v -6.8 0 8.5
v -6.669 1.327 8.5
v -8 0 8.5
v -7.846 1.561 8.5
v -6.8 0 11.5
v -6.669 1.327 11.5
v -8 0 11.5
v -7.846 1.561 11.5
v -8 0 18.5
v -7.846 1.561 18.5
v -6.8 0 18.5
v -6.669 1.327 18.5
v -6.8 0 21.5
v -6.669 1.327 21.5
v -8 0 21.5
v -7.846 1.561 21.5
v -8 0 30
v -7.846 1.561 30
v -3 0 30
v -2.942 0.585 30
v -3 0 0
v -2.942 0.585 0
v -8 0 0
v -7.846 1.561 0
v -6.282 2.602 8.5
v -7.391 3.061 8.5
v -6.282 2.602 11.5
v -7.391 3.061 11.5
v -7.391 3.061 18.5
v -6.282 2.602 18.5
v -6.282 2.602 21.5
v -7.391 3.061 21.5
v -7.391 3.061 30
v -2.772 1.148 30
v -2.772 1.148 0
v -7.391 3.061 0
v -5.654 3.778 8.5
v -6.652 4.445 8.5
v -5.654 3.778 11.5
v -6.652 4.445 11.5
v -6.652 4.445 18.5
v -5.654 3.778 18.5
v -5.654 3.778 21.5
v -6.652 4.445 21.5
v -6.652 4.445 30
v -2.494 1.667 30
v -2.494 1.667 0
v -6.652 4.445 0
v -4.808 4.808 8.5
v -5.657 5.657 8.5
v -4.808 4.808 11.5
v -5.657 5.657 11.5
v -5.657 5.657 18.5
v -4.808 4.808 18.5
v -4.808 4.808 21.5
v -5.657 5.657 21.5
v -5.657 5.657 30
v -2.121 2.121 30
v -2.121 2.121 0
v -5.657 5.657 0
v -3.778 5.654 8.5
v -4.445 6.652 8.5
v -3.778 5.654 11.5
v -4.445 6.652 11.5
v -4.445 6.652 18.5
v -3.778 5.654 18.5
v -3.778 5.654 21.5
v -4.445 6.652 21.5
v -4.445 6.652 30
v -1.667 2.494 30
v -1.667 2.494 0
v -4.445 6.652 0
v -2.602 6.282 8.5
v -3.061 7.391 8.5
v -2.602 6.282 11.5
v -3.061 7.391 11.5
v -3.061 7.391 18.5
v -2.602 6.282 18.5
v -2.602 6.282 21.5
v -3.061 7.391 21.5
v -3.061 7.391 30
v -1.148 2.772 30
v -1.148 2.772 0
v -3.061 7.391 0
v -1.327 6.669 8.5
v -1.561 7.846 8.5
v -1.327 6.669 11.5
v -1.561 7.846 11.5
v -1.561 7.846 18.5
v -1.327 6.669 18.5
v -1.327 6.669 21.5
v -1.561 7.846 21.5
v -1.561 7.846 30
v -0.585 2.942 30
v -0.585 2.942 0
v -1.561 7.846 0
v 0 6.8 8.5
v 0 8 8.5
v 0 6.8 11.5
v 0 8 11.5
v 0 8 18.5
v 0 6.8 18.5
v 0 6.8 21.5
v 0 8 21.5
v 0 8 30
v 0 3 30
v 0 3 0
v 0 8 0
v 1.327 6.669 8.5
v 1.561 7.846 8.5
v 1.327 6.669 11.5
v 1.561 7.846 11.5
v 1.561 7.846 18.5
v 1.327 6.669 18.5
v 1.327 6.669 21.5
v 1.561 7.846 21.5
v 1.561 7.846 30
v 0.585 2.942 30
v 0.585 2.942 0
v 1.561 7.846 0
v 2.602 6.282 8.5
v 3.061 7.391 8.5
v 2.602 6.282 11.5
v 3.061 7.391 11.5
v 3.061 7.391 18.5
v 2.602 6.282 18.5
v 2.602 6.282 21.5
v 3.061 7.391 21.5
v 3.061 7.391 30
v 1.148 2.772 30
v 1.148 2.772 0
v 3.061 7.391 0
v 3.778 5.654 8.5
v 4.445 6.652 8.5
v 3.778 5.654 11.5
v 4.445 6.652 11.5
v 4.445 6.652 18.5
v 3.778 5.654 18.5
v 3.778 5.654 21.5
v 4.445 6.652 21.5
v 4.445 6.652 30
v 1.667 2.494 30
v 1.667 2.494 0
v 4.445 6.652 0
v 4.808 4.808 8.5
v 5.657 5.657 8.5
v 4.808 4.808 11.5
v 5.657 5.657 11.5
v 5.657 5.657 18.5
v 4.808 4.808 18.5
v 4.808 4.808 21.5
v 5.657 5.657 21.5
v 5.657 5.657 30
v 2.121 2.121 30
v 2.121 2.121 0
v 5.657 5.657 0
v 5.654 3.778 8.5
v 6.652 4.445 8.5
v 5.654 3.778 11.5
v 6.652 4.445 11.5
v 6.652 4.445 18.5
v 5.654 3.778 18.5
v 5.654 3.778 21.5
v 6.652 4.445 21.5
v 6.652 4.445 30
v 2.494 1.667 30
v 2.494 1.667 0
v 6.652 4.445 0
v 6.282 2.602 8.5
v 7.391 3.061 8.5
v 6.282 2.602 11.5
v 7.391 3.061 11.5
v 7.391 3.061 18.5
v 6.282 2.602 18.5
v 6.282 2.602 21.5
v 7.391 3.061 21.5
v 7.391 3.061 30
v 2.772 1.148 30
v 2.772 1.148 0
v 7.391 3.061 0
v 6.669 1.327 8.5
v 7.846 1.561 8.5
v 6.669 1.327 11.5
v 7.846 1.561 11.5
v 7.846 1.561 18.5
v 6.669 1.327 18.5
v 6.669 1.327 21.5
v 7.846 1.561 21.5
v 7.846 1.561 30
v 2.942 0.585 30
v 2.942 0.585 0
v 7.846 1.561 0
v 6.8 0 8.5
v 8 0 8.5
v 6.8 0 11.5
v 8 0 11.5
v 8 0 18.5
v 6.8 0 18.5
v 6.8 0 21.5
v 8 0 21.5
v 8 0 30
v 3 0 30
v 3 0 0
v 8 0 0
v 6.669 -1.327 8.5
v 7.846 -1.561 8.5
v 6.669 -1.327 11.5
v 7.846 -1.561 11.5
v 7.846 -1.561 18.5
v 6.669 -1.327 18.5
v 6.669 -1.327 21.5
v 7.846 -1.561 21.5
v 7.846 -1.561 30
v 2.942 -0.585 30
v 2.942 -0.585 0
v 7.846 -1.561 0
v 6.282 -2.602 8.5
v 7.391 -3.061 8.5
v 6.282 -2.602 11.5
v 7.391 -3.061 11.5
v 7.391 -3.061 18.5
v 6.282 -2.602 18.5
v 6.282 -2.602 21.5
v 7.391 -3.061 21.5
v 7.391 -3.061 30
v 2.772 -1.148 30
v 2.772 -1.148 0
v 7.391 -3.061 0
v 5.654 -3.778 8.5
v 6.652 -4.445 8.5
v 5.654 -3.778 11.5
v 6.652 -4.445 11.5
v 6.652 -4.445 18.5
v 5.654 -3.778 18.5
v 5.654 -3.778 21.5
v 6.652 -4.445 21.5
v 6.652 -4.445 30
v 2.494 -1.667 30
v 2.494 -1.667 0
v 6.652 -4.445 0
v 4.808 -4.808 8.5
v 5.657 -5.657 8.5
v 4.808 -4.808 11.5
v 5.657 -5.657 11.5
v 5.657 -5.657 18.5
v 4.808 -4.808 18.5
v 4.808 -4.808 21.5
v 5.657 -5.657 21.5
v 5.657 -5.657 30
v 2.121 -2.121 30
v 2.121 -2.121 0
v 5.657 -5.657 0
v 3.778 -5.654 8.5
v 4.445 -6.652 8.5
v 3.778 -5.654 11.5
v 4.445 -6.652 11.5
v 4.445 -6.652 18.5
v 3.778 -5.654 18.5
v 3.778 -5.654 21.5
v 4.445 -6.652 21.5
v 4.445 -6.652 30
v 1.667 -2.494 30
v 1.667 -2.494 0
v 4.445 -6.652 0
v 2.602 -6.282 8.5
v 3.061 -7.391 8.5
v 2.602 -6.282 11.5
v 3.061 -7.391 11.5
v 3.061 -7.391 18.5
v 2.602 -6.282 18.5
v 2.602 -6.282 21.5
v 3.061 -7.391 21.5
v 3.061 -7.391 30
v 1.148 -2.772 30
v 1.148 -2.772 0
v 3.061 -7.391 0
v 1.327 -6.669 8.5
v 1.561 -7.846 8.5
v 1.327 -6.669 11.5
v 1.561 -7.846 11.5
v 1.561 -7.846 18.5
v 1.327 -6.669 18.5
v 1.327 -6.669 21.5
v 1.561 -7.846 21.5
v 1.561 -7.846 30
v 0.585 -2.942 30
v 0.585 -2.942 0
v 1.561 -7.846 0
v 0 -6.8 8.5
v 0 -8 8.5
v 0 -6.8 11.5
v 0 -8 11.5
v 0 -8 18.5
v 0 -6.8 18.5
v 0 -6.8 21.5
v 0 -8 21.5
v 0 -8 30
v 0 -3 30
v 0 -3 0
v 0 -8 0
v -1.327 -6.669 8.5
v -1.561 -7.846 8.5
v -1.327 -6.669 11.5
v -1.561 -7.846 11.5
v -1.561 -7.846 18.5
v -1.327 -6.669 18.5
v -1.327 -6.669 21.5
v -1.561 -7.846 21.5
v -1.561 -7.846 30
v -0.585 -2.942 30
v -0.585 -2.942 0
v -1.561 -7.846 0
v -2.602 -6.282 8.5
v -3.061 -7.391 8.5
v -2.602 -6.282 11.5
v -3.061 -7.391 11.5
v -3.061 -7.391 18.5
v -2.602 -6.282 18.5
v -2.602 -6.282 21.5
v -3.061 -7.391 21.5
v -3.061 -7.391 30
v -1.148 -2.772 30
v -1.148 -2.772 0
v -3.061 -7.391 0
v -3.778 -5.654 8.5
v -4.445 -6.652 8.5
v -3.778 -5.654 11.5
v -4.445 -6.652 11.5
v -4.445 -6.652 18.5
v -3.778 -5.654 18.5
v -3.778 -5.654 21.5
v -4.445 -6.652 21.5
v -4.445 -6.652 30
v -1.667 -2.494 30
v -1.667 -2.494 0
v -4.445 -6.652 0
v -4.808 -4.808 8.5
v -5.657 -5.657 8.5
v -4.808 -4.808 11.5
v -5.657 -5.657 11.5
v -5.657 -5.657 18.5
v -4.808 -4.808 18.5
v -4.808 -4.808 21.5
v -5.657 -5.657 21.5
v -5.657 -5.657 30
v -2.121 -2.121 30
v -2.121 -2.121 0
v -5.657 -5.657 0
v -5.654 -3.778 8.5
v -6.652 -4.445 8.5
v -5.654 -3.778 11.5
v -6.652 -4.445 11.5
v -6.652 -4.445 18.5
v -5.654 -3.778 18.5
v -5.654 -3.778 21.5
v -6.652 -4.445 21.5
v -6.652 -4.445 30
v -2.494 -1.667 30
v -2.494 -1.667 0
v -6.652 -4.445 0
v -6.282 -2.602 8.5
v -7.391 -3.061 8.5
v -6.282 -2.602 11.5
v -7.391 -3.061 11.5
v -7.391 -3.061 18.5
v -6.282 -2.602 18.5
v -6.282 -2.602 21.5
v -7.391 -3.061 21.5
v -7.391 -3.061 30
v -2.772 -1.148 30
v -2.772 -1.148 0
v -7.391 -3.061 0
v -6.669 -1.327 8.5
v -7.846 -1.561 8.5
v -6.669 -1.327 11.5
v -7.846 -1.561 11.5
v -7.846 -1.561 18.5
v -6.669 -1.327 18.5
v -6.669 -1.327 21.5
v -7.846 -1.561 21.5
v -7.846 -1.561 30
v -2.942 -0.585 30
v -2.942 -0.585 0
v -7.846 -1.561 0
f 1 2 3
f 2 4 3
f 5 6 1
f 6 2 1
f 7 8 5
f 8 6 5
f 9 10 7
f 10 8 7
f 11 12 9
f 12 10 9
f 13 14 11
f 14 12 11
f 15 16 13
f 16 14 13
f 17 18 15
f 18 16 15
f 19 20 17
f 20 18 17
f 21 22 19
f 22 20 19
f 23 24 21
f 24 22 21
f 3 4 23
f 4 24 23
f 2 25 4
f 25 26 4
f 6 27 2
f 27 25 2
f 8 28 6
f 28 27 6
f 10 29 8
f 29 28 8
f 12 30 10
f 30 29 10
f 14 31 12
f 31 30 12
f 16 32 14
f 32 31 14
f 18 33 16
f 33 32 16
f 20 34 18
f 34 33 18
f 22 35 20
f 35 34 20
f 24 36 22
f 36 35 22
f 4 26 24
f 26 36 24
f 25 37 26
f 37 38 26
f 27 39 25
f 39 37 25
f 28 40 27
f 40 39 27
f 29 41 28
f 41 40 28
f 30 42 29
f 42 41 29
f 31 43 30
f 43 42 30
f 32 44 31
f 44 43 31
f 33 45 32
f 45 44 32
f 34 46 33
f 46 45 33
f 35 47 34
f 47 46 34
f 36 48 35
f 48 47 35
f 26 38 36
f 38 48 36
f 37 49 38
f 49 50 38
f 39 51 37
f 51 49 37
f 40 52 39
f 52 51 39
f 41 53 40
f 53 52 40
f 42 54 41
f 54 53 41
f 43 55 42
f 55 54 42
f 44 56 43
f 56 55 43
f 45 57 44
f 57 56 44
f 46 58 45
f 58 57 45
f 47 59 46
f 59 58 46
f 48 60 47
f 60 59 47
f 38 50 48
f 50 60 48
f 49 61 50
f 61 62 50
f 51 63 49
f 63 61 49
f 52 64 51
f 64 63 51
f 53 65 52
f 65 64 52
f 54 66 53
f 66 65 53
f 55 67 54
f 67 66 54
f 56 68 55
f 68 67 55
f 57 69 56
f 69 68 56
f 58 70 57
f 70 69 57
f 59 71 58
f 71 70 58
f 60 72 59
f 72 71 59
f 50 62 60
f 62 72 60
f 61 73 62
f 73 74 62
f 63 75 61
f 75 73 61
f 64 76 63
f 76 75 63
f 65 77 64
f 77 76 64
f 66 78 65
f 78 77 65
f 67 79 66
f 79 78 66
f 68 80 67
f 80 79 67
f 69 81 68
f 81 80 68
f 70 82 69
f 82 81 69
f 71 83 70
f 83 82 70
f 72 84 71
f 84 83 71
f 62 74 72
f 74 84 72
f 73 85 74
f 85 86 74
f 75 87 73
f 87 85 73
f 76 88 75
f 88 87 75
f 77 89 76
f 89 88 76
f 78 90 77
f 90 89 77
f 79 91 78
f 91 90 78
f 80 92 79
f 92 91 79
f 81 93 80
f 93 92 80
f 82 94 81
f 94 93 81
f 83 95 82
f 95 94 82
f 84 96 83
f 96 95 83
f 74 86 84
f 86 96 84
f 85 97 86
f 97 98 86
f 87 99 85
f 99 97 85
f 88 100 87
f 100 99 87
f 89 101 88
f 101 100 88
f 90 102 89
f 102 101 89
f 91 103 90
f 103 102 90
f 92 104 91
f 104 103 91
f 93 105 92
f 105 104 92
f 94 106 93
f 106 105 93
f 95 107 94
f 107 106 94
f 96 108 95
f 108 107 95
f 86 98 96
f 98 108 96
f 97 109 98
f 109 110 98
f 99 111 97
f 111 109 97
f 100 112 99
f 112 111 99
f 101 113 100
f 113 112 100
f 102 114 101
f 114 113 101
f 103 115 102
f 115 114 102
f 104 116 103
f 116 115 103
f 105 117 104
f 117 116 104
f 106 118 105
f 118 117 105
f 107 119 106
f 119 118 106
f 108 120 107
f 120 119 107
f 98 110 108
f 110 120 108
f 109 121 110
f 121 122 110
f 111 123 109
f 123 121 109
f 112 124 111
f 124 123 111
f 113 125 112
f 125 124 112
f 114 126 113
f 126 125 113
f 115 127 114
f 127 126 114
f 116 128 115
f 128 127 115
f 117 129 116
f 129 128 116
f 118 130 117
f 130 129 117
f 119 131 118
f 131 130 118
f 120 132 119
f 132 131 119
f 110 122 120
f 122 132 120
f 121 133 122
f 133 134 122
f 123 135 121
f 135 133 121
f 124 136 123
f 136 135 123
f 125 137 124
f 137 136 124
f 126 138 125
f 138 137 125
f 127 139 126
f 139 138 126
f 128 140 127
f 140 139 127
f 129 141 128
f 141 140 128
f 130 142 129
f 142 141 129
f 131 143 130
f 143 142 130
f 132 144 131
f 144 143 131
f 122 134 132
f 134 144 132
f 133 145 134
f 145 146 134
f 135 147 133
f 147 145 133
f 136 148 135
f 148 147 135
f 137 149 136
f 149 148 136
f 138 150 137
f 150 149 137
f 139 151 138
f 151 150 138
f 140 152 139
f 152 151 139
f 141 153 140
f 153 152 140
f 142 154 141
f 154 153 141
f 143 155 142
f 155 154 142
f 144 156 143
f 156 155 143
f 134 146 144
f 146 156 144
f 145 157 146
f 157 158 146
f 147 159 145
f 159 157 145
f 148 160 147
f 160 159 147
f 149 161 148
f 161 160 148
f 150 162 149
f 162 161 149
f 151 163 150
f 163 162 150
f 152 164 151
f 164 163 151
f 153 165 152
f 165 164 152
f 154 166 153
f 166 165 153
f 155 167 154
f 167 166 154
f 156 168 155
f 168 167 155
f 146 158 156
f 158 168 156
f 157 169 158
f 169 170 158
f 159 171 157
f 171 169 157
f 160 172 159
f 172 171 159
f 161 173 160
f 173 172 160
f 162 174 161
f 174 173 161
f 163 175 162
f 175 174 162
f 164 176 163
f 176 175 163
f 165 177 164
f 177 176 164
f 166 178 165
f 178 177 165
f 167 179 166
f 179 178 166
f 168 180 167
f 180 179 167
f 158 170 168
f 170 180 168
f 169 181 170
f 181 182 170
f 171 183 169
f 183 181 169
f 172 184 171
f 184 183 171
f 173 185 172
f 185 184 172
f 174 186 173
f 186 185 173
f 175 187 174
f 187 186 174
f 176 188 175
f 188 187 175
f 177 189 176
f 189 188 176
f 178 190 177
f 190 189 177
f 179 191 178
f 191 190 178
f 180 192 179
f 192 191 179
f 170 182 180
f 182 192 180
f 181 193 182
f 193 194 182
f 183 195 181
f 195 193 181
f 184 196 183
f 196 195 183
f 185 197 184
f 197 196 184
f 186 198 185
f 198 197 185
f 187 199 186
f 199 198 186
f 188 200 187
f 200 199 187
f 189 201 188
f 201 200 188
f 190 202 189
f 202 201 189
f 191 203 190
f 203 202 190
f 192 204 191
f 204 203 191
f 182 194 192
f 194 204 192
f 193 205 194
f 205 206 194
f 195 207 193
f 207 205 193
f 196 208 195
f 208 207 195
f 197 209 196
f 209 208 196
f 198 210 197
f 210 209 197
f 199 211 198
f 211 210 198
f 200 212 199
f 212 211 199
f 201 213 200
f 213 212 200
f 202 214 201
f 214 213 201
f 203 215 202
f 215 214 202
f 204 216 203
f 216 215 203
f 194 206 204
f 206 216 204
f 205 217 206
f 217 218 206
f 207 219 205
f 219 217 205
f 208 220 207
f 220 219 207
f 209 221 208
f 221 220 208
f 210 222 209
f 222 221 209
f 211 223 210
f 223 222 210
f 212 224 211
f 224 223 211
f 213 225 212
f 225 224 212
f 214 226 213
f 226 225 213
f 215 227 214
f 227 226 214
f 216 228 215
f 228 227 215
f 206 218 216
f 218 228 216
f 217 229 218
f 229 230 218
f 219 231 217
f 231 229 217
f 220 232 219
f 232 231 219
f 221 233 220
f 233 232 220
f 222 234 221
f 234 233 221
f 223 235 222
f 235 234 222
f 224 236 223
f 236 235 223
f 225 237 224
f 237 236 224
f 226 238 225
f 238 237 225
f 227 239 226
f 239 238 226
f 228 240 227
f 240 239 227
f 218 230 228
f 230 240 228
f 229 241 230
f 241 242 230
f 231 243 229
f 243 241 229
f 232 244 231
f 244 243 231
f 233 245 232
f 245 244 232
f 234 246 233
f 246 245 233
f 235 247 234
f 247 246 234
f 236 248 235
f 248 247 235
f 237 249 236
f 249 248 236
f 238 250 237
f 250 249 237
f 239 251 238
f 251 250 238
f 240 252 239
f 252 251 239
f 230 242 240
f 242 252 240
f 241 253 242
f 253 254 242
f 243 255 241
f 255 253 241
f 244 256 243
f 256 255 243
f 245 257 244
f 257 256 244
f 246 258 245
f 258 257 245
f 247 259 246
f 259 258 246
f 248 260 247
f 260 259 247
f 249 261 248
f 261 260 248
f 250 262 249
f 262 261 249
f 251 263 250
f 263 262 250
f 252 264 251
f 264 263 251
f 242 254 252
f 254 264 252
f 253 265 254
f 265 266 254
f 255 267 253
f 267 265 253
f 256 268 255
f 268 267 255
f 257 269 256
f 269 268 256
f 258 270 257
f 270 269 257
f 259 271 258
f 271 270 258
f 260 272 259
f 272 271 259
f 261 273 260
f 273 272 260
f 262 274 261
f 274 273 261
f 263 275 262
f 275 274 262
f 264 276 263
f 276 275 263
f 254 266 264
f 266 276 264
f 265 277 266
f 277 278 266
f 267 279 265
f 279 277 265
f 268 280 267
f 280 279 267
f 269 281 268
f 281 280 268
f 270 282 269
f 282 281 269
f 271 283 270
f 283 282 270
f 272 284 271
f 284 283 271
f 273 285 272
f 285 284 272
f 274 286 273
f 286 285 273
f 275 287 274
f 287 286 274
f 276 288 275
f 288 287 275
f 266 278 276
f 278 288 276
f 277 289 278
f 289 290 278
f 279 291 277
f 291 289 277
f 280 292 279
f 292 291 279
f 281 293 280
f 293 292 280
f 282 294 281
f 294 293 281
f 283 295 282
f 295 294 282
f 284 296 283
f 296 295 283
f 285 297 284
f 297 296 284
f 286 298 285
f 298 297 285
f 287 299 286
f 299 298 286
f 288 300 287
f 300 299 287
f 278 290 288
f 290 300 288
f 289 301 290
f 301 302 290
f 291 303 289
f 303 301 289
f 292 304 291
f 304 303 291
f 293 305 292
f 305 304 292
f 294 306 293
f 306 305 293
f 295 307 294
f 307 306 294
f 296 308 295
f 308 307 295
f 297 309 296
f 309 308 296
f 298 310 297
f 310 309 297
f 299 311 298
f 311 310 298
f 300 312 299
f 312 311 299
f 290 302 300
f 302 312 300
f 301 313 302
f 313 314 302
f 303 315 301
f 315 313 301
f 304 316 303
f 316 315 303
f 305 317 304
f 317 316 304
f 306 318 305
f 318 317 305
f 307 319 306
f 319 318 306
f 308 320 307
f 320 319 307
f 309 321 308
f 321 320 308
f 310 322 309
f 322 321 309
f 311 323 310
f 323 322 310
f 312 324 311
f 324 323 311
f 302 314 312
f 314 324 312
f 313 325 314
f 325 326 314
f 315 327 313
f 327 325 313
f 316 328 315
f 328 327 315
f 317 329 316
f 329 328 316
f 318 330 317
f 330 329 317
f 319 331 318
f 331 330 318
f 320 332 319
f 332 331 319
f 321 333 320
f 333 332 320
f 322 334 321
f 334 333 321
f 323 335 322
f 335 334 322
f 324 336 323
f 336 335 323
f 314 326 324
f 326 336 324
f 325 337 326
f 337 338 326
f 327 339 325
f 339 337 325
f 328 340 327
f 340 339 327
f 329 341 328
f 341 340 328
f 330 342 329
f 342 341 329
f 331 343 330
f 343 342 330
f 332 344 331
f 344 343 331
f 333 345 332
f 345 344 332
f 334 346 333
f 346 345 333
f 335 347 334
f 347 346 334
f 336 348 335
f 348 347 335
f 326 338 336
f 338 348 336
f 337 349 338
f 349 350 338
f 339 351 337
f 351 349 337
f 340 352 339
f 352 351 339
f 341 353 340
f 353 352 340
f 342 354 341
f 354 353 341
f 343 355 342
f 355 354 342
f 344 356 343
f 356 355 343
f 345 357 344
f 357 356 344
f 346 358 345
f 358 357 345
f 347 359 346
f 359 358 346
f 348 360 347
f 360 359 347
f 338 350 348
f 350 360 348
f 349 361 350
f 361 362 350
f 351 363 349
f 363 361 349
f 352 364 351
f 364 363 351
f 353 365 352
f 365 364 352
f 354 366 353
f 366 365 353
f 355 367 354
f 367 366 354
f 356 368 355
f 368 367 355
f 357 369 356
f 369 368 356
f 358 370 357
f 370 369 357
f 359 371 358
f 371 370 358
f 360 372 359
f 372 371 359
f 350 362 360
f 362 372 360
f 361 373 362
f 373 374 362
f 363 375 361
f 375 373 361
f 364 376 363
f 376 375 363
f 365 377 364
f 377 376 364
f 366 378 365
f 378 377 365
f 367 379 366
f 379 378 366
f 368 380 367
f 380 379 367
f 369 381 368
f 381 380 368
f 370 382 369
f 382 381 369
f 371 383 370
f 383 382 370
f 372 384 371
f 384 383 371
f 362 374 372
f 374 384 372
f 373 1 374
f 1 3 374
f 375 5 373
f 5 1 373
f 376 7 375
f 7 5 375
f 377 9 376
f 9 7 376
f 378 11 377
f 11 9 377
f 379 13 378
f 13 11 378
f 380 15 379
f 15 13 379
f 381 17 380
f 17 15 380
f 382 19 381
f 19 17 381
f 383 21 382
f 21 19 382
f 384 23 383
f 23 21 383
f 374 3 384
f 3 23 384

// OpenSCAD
$fn = 32;

// ----------------------------------------------------------------------
// Grooved revolve: stepped, bore R3
// ----------------------------------------------------------------------

// --- parameters (mm) ---
bore_r = 3;               // bore radius
outer_r = 8;              // outer radius of the body
total_h = 30;             // overall height, Z
wall = 5;                 // radial wall thickness
groove_w = 3;             // groove width
groove_d = 1.2;           // groove depth
grooves = 2;              // number of outer grooves

bbox_x = 2 * outer_r;  // full diameter
bore_d = 2 * bore_r;  // bore diameter
body_d = 2 * outer_r;  // body diameter
revolve_angle = 360;  // full turn around the Z axis

profile = [[3, 0], [8, 0], [8, 8.5], [6.8, 8.5], [6.8, 11.5], [8, 11.5], [8, 18.5], [6.8, 18.5], [6.8, 21.5], [8, 21.5], [8, 30], [3, 30]];  // primary outline, 12 points, counter clockwise

// --- the one profile operation ---
rotate_extrude(angle = revolve_angle) polygon(points = profile);
